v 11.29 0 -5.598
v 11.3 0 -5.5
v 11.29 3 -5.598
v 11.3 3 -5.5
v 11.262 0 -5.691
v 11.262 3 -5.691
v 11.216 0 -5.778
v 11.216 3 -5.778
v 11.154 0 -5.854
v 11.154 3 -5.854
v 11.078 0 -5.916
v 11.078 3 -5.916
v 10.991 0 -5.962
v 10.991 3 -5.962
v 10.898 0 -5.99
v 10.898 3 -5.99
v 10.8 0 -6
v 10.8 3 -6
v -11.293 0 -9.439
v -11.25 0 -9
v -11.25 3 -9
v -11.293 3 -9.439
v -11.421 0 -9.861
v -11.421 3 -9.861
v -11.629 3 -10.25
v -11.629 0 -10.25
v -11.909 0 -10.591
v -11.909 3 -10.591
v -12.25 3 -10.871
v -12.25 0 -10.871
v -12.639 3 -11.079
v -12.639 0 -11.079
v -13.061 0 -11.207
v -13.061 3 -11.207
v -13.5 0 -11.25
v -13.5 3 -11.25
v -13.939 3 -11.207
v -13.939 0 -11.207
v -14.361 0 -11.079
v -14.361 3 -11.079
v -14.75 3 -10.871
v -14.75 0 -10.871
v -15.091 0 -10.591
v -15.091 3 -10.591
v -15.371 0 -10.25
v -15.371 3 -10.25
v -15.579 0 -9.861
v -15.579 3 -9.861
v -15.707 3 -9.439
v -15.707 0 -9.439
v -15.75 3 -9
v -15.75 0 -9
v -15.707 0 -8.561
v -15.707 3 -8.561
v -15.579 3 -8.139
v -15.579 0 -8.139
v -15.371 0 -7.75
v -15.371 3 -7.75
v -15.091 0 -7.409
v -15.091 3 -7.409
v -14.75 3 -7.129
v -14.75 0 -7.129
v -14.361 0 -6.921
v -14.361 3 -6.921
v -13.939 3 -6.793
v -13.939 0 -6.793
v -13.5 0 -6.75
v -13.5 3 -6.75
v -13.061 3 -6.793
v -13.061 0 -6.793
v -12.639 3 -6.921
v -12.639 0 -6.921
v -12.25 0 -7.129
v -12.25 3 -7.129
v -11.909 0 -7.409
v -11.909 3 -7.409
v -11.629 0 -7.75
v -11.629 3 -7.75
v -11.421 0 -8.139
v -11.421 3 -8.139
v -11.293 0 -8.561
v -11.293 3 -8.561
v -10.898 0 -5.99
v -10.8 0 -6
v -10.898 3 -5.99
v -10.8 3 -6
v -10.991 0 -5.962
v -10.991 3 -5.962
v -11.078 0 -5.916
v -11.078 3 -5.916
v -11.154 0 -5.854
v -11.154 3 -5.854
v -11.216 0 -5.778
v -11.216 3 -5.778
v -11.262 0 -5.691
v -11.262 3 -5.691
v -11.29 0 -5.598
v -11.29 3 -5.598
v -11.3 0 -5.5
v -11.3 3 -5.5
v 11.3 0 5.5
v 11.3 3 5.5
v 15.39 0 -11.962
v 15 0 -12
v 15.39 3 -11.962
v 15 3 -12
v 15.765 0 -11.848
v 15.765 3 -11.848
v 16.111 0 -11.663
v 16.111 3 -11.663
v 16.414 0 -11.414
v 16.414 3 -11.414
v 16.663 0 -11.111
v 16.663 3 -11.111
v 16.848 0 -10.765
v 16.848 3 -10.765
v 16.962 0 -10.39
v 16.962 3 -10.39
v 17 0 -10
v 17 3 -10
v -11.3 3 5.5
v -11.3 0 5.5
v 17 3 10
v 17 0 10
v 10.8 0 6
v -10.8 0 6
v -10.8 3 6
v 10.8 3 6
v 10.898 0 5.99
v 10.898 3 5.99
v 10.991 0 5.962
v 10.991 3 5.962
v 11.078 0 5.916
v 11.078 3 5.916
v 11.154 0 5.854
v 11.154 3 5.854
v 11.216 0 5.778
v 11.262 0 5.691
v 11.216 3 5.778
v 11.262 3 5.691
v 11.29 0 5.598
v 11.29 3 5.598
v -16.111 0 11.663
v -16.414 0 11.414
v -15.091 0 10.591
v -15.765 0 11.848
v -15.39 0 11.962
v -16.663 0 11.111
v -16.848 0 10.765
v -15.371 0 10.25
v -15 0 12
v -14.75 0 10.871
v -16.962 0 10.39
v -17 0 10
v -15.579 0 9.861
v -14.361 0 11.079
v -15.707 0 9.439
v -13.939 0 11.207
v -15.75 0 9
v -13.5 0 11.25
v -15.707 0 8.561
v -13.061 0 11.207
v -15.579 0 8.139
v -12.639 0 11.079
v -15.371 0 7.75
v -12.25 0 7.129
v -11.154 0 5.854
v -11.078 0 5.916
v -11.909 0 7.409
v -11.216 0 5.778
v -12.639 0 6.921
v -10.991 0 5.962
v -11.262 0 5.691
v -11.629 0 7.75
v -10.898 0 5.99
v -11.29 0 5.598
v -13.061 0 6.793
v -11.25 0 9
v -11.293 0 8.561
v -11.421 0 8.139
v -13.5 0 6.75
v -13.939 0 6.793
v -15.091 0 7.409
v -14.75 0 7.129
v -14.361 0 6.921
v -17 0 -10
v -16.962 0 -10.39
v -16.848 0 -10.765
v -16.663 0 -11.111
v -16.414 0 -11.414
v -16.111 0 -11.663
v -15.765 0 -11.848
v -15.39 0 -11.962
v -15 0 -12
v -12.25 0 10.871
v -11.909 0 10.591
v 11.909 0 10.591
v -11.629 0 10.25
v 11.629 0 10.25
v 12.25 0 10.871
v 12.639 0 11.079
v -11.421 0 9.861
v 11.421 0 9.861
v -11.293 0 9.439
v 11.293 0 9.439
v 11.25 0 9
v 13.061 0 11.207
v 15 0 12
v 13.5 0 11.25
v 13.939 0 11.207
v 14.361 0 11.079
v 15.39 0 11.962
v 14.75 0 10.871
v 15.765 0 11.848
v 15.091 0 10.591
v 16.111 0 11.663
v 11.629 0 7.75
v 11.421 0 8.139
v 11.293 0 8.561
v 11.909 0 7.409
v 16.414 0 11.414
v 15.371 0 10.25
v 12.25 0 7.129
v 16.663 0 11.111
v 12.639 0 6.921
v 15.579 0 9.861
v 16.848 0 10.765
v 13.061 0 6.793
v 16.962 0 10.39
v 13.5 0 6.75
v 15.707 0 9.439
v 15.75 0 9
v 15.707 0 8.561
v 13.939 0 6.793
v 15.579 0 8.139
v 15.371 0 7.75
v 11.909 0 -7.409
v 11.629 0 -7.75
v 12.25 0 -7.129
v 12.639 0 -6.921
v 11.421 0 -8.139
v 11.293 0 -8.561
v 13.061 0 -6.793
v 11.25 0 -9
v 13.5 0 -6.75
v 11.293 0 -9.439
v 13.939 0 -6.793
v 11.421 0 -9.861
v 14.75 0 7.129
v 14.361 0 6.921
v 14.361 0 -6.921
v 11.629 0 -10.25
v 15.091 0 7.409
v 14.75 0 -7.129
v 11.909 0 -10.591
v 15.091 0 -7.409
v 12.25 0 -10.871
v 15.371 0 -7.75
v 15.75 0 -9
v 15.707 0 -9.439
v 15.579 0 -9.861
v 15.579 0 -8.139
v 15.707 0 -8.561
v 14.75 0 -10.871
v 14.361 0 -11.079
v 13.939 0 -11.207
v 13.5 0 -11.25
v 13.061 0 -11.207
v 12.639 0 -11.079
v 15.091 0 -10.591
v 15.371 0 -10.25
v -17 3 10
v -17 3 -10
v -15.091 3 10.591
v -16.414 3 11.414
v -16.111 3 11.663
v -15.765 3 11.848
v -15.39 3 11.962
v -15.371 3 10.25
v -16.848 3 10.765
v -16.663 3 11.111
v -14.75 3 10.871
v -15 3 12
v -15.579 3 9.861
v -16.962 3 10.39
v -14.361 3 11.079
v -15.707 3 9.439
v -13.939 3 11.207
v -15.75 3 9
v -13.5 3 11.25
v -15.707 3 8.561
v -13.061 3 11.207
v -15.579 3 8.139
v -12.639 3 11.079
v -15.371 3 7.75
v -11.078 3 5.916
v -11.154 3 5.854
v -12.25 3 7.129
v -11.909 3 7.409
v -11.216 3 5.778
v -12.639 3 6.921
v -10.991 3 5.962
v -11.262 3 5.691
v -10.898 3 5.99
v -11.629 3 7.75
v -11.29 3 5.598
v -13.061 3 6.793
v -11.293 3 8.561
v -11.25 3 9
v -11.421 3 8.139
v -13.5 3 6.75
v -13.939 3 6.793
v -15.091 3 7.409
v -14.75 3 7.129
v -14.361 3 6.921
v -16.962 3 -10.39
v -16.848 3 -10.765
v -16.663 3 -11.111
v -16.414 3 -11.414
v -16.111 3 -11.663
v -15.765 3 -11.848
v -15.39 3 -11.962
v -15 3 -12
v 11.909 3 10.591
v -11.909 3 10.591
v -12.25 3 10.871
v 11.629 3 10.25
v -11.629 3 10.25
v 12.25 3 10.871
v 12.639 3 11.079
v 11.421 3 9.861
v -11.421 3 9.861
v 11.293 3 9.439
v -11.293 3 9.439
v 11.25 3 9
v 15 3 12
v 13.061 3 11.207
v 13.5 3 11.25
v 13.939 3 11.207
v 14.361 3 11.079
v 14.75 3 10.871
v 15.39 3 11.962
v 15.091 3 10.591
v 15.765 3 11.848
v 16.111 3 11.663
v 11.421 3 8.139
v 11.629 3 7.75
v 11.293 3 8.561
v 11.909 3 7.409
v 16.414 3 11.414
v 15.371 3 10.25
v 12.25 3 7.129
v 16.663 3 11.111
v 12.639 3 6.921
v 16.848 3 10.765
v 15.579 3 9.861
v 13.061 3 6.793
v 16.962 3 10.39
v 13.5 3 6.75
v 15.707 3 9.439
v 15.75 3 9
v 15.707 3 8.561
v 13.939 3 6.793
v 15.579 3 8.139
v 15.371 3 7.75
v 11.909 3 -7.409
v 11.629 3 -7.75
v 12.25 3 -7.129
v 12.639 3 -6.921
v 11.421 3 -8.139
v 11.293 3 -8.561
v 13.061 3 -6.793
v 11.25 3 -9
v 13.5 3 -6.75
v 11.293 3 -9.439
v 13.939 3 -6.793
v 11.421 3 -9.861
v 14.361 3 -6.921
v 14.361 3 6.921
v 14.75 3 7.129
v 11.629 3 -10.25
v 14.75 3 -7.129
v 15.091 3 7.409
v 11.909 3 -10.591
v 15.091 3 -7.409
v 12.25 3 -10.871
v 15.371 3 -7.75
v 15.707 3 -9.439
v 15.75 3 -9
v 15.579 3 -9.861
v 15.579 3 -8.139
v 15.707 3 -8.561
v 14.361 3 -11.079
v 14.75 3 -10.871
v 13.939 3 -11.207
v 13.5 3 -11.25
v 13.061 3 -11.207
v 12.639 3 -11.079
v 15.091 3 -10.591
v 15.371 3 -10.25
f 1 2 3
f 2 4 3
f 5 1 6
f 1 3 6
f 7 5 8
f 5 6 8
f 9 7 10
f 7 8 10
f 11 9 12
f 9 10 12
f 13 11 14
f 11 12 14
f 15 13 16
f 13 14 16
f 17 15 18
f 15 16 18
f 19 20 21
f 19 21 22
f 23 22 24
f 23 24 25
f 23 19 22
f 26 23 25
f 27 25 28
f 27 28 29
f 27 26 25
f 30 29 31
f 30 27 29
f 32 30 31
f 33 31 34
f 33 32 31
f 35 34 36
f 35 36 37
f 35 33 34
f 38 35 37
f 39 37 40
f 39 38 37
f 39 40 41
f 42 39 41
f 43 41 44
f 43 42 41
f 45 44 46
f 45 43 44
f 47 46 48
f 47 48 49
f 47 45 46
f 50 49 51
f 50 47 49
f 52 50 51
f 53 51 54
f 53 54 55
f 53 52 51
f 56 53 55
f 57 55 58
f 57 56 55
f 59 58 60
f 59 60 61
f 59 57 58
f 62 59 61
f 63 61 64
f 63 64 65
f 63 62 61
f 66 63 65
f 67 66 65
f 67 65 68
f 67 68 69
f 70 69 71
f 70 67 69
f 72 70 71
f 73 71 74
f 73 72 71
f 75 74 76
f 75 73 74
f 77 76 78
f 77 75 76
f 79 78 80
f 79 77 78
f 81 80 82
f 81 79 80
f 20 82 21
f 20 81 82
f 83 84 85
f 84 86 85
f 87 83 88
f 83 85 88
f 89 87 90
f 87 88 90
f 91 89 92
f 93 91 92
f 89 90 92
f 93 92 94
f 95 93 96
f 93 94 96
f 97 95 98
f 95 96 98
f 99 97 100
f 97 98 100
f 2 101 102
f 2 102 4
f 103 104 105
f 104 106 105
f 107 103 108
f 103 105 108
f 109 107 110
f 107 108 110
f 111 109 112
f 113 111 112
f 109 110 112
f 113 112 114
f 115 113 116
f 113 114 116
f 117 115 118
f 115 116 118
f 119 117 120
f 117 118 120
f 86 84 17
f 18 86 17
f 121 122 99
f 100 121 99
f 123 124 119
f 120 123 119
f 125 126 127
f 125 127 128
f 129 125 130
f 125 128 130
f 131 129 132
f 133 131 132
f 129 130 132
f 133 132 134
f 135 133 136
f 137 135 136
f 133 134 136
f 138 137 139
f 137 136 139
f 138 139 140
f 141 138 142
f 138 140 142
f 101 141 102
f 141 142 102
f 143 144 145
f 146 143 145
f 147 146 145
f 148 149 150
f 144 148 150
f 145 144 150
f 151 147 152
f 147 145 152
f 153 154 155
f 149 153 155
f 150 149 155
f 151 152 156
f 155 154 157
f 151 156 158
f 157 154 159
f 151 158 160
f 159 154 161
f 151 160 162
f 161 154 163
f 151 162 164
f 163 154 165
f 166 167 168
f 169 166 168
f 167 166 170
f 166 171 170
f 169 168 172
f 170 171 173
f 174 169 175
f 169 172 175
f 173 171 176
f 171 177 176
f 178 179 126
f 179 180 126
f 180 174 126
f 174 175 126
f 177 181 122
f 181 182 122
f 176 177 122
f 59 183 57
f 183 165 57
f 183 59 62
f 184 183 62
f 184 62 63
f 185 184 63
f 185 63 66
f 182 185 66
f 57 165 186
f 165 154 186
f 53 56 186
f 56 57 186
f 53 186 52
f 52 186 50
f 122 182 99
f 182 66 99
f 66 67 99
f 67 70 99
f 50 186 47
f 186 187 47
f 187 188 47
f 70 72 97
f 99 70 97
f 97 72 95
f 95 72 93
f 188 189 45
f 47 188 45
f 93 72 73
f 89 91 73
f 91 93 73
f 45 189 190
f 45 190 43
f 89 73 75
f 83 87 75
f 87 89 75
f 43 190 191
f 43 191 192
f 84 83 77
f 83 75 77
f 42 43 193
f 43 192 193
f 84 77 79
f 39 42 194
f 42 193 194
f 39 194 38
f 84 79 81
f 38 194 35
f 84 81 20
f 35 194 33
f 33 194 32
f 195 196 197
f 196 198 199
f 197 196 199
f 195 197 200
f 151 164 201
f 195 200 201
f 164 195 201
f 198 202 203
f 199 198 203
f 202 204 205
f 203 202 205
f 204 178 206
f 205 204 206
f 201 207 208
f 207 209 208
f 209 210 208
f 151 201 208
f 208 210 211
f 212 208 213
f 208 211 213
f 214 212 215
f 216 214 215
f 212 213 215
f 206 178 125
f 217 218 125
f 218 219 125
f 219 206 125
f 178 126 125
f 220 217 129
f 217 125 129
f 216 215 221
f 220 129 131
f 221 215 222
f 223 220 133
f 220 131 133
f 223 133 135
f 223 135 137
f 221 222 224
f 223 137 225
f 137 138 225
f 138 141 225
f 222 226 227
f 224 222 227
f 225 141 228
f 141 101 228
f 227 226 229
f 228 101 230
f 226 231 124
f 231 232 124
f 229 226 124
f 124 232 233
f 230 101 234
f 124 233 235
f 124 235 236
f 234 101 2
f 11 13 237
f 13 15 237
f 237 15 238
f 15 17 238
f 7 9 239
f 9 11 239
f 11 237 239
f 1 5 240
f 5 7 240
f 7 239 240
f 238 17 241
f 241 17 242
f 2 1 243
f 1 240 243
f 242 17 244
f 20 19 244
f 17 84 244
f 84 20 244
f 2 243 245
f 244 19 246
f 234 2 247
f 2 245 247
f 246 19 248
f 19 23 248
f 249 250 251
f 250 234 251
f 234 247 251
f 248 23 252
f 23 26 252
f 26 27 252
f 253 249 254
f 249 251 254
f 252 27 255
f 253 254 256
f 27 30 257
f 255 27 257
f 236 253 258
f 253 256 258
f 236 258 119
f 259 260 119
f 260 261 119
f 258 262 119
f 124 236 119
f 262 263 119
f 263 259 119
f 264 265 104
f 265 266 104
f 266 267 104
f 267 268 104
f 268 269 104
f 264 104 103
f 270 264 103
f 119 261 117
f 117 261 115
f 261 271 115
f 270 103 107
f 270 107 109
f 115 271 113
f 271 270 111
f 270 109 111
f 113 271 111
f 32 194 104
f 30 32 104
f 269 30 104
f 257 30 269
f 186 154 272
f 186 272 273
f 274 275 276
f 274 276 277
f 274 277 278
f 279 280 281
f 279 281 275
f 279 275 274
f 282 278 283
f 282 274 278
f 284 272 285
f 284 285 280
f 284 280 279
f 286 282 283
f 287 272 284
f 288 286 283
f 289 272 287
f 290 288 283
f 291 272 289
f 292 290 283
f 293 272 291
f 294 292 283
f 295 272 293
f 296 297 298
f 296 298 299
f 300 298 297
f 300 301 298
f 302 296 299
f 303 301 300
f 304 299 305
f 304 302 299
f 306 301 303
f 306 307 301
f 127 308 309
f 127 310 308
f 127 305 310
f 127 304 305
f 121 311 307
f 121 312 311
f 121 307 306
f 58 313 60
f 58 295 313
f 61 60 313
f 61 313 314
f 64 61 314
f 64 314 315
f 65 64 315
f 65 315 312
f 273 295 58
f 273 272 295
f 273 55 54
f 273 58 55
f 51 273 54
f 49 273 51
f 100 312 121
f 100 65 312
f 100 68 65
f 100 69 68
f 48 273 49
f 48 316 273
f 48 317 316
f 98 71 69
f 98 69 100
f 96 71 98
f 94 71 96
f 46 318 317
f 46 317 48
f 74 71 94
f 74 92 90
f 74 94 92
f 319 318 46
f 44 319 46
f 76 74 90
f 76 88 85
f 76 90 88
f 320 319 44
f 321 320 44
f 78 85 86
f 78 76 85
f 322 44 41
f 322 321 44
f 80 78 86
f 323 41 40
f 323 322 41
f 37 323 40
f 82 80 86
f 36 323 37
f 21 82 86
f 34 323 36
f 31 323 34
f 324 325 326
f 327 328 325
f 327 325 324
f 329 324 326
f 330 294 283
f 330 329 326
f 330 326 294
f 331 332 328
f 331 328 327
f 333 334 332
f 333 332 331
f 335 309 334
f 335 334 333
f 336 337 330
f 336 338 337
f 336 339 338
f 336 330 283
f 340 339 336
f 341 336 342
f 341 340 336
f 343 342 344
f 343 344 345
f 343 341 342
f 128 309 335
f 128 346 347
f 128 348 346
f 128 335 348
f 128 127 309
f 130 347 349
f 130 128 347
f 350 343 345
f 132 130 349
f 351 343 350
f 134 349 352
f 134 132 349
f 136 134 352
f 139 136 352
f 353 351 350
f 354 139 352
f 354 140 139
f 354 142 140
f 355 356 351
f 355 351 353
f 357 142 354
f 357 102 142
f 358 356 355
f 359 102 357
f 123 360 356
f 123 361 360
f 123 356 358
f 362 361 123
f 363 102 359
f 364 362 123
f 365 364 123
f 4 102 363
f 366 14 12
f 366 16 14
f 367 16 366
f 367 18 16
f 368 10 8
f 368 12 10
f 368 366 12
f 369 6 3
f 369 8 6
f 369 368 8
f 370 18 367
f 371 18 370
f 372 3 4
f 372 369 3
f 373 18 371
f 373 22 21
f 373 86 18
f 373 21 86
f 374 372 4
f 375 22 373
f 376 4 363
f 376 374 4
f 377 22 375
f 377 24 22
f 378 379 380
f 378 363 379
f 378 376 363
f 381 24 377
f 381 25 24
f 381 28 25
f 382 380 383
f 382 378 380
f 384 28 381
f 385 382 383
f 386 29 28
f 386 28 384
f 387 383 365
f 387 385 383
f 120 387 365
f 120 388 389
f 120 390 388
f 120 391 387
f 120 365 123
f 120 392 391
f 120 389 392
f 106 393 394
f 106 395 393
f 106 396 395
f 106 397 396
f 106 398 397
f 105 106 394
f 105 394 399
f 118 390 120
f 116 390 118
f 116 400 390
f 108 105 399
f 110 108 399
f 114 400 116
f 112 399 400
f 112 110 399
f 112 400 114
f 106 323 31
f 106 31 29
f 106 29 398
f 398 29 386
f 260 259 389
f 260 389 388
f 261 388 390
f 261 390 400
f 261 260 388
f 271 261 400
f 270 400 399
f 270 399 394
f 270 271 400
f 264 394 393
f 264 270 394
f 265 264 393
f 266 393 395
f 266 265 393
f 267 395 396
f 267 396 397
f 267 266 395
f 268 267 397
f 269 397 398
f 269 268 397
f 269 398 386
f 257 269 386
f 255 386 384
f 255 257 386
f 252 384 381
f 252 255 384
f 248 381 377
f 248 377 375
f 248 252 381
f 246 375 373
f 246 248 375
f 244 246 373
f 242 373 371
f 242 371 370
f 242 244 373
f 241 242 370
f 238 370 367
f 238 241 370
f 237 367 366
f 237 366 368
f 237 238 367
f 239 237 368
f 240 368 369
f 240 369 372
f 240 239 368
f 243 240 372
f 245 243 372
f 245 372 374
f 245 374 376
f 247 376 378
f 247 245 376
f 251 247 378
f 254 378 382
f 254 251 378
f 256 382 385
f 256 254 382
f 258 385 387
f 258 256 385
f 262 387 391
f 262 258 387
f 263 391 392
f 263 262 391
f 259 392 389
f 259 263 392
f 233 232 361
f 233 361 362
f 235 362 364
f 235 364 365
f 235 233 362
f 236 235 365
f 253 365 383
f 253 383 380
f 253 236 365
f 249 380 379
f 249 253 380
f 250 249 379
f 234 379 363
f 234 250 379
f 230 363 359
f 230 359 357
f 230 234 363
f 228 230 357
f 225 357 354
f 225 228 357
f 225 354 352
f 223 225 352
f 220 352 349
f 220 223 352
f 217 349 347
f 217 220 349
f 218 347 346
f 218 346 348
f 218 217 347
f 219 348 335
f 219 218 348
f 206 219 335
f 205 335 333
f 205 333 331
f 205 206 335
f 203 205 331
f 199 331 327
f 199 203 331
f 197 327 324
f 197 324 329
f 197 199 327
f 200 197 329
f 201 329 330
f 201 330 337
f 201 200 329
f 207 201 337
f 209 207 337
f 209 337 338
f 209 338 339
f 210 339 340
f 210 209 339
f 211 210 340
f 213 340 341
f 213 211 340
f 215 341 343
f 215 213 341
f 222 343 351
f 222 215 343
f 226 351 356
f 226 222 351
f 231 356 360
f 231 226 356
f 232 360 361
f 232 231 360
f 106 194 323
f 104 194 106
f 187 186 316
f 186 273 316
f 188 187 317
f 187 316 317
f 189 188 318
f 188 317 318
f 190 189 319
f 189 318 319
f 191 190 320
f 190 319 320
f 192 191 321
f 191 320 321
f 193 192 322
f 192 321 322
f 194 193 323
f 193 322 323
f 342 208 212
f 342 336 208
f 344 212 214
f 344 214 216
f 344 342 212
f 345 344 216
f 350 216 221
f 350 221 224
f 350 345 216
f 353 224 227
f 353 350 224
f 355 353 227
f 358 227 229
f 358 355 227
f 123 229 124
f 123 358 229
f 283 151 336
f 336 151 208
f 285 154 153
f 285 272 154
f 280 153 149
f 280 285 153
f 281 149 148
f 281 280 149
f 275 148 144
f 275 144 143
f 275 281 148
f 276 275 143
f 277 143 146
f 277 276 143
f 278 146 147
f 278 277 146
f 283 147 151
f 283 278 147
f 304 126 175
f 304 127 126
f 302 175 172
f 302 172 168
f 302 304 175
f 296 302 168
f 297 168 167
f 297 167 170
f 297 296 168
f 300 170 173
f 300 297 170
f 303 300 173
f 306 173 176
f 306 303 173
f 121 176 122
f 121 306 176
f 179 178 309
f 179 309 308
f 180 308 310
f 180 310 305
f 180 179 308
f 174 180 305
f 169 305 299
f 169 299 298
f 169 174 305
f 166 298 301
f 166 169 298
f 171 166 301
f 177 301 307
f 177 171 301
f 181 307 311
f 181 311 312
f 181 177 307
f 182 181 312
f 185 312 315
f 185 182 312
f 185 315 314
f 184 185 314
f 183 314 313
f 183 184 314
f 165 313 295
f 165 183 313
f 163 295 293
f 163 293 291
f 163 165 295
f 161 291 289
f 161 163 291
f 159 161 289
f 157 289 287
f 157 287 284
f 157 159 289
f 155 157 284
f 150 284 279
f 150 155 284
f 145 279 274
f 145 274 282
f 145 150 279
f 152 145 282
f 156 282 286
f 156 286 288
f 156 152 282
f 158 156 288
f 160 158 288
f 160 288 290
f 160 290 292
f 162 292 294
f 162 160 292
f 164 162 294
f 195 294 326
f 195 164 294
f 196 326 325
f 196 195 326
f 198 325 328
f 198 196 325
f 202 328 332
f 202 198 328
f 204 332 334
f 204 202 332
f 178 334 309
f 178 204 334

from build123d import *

# Parameters (mm, degrees)
SKETCH1_W           = 34
SKETCH1_H           = 24
SKETCH1_R           = 2.25
SKETCH1_W_2         = 22.6
SKETCH1_H_2         = 12
BOSS_EXTRUDE1_DEPTH = 3
FILLET1_R           = 0.5
FILLET2_R           = 2


with BuildPart() as part:
    # Sketch1 → Boss-Extrude1 (new body)
    with BuildSketch(Plane(origin=(0, 0, 0), x_dir=(1, 0, 0), z_dir=(0, 1, 0))):
        Rectangle(SKETCH1_W, SKETCH1_H)
        with Locations((-13.5, -9)):
            Circle(SKETCH1_R, mode=Mode.SUBTRACT)
        with Locations((-13.5, 9)):
            Circle(SKETCH1_R, mode=Mode.SUBTRACT)
        with Locations((13.5, -9)):
            Circle(SKETCH1_R, mode=Mode.SUBTRACT)
        with Locations((13.5, 9)):
            Circle(SKETCH1_R, mode=Mode.SUBTRACT)
        Rectangle(SKETCH1_W_2, SKETCH1_H_2, mode=Mode.SUBTRACT)
    extrude(amount=BOSS_EXTRUDE1_DEPTH)

    # Fillet1
    fillet1_edges = [part.edges().sort_by_distance(p)[0] for p in [
        (11.3, 1.5, 6),
        (11.3, 1.5, -6),
        (-11.3, 1.5, -6),
        (-11.3, 1.5, 6),
    ]]
    fillet(fillet1_edges, radius=FILLET1_R)

    # Fillet2
    fillet2_edges = [part.edges().sort_by_distance(p)[0] for p in [
        (17, 1.5, 12),
        (-17, 1.5, 12),
        (-17, 1.5, -12),
        (17, 1.5, -12),
    ]]
    fillet(fillet2_edges, radius=FILLET2_R)


solid = part.part
